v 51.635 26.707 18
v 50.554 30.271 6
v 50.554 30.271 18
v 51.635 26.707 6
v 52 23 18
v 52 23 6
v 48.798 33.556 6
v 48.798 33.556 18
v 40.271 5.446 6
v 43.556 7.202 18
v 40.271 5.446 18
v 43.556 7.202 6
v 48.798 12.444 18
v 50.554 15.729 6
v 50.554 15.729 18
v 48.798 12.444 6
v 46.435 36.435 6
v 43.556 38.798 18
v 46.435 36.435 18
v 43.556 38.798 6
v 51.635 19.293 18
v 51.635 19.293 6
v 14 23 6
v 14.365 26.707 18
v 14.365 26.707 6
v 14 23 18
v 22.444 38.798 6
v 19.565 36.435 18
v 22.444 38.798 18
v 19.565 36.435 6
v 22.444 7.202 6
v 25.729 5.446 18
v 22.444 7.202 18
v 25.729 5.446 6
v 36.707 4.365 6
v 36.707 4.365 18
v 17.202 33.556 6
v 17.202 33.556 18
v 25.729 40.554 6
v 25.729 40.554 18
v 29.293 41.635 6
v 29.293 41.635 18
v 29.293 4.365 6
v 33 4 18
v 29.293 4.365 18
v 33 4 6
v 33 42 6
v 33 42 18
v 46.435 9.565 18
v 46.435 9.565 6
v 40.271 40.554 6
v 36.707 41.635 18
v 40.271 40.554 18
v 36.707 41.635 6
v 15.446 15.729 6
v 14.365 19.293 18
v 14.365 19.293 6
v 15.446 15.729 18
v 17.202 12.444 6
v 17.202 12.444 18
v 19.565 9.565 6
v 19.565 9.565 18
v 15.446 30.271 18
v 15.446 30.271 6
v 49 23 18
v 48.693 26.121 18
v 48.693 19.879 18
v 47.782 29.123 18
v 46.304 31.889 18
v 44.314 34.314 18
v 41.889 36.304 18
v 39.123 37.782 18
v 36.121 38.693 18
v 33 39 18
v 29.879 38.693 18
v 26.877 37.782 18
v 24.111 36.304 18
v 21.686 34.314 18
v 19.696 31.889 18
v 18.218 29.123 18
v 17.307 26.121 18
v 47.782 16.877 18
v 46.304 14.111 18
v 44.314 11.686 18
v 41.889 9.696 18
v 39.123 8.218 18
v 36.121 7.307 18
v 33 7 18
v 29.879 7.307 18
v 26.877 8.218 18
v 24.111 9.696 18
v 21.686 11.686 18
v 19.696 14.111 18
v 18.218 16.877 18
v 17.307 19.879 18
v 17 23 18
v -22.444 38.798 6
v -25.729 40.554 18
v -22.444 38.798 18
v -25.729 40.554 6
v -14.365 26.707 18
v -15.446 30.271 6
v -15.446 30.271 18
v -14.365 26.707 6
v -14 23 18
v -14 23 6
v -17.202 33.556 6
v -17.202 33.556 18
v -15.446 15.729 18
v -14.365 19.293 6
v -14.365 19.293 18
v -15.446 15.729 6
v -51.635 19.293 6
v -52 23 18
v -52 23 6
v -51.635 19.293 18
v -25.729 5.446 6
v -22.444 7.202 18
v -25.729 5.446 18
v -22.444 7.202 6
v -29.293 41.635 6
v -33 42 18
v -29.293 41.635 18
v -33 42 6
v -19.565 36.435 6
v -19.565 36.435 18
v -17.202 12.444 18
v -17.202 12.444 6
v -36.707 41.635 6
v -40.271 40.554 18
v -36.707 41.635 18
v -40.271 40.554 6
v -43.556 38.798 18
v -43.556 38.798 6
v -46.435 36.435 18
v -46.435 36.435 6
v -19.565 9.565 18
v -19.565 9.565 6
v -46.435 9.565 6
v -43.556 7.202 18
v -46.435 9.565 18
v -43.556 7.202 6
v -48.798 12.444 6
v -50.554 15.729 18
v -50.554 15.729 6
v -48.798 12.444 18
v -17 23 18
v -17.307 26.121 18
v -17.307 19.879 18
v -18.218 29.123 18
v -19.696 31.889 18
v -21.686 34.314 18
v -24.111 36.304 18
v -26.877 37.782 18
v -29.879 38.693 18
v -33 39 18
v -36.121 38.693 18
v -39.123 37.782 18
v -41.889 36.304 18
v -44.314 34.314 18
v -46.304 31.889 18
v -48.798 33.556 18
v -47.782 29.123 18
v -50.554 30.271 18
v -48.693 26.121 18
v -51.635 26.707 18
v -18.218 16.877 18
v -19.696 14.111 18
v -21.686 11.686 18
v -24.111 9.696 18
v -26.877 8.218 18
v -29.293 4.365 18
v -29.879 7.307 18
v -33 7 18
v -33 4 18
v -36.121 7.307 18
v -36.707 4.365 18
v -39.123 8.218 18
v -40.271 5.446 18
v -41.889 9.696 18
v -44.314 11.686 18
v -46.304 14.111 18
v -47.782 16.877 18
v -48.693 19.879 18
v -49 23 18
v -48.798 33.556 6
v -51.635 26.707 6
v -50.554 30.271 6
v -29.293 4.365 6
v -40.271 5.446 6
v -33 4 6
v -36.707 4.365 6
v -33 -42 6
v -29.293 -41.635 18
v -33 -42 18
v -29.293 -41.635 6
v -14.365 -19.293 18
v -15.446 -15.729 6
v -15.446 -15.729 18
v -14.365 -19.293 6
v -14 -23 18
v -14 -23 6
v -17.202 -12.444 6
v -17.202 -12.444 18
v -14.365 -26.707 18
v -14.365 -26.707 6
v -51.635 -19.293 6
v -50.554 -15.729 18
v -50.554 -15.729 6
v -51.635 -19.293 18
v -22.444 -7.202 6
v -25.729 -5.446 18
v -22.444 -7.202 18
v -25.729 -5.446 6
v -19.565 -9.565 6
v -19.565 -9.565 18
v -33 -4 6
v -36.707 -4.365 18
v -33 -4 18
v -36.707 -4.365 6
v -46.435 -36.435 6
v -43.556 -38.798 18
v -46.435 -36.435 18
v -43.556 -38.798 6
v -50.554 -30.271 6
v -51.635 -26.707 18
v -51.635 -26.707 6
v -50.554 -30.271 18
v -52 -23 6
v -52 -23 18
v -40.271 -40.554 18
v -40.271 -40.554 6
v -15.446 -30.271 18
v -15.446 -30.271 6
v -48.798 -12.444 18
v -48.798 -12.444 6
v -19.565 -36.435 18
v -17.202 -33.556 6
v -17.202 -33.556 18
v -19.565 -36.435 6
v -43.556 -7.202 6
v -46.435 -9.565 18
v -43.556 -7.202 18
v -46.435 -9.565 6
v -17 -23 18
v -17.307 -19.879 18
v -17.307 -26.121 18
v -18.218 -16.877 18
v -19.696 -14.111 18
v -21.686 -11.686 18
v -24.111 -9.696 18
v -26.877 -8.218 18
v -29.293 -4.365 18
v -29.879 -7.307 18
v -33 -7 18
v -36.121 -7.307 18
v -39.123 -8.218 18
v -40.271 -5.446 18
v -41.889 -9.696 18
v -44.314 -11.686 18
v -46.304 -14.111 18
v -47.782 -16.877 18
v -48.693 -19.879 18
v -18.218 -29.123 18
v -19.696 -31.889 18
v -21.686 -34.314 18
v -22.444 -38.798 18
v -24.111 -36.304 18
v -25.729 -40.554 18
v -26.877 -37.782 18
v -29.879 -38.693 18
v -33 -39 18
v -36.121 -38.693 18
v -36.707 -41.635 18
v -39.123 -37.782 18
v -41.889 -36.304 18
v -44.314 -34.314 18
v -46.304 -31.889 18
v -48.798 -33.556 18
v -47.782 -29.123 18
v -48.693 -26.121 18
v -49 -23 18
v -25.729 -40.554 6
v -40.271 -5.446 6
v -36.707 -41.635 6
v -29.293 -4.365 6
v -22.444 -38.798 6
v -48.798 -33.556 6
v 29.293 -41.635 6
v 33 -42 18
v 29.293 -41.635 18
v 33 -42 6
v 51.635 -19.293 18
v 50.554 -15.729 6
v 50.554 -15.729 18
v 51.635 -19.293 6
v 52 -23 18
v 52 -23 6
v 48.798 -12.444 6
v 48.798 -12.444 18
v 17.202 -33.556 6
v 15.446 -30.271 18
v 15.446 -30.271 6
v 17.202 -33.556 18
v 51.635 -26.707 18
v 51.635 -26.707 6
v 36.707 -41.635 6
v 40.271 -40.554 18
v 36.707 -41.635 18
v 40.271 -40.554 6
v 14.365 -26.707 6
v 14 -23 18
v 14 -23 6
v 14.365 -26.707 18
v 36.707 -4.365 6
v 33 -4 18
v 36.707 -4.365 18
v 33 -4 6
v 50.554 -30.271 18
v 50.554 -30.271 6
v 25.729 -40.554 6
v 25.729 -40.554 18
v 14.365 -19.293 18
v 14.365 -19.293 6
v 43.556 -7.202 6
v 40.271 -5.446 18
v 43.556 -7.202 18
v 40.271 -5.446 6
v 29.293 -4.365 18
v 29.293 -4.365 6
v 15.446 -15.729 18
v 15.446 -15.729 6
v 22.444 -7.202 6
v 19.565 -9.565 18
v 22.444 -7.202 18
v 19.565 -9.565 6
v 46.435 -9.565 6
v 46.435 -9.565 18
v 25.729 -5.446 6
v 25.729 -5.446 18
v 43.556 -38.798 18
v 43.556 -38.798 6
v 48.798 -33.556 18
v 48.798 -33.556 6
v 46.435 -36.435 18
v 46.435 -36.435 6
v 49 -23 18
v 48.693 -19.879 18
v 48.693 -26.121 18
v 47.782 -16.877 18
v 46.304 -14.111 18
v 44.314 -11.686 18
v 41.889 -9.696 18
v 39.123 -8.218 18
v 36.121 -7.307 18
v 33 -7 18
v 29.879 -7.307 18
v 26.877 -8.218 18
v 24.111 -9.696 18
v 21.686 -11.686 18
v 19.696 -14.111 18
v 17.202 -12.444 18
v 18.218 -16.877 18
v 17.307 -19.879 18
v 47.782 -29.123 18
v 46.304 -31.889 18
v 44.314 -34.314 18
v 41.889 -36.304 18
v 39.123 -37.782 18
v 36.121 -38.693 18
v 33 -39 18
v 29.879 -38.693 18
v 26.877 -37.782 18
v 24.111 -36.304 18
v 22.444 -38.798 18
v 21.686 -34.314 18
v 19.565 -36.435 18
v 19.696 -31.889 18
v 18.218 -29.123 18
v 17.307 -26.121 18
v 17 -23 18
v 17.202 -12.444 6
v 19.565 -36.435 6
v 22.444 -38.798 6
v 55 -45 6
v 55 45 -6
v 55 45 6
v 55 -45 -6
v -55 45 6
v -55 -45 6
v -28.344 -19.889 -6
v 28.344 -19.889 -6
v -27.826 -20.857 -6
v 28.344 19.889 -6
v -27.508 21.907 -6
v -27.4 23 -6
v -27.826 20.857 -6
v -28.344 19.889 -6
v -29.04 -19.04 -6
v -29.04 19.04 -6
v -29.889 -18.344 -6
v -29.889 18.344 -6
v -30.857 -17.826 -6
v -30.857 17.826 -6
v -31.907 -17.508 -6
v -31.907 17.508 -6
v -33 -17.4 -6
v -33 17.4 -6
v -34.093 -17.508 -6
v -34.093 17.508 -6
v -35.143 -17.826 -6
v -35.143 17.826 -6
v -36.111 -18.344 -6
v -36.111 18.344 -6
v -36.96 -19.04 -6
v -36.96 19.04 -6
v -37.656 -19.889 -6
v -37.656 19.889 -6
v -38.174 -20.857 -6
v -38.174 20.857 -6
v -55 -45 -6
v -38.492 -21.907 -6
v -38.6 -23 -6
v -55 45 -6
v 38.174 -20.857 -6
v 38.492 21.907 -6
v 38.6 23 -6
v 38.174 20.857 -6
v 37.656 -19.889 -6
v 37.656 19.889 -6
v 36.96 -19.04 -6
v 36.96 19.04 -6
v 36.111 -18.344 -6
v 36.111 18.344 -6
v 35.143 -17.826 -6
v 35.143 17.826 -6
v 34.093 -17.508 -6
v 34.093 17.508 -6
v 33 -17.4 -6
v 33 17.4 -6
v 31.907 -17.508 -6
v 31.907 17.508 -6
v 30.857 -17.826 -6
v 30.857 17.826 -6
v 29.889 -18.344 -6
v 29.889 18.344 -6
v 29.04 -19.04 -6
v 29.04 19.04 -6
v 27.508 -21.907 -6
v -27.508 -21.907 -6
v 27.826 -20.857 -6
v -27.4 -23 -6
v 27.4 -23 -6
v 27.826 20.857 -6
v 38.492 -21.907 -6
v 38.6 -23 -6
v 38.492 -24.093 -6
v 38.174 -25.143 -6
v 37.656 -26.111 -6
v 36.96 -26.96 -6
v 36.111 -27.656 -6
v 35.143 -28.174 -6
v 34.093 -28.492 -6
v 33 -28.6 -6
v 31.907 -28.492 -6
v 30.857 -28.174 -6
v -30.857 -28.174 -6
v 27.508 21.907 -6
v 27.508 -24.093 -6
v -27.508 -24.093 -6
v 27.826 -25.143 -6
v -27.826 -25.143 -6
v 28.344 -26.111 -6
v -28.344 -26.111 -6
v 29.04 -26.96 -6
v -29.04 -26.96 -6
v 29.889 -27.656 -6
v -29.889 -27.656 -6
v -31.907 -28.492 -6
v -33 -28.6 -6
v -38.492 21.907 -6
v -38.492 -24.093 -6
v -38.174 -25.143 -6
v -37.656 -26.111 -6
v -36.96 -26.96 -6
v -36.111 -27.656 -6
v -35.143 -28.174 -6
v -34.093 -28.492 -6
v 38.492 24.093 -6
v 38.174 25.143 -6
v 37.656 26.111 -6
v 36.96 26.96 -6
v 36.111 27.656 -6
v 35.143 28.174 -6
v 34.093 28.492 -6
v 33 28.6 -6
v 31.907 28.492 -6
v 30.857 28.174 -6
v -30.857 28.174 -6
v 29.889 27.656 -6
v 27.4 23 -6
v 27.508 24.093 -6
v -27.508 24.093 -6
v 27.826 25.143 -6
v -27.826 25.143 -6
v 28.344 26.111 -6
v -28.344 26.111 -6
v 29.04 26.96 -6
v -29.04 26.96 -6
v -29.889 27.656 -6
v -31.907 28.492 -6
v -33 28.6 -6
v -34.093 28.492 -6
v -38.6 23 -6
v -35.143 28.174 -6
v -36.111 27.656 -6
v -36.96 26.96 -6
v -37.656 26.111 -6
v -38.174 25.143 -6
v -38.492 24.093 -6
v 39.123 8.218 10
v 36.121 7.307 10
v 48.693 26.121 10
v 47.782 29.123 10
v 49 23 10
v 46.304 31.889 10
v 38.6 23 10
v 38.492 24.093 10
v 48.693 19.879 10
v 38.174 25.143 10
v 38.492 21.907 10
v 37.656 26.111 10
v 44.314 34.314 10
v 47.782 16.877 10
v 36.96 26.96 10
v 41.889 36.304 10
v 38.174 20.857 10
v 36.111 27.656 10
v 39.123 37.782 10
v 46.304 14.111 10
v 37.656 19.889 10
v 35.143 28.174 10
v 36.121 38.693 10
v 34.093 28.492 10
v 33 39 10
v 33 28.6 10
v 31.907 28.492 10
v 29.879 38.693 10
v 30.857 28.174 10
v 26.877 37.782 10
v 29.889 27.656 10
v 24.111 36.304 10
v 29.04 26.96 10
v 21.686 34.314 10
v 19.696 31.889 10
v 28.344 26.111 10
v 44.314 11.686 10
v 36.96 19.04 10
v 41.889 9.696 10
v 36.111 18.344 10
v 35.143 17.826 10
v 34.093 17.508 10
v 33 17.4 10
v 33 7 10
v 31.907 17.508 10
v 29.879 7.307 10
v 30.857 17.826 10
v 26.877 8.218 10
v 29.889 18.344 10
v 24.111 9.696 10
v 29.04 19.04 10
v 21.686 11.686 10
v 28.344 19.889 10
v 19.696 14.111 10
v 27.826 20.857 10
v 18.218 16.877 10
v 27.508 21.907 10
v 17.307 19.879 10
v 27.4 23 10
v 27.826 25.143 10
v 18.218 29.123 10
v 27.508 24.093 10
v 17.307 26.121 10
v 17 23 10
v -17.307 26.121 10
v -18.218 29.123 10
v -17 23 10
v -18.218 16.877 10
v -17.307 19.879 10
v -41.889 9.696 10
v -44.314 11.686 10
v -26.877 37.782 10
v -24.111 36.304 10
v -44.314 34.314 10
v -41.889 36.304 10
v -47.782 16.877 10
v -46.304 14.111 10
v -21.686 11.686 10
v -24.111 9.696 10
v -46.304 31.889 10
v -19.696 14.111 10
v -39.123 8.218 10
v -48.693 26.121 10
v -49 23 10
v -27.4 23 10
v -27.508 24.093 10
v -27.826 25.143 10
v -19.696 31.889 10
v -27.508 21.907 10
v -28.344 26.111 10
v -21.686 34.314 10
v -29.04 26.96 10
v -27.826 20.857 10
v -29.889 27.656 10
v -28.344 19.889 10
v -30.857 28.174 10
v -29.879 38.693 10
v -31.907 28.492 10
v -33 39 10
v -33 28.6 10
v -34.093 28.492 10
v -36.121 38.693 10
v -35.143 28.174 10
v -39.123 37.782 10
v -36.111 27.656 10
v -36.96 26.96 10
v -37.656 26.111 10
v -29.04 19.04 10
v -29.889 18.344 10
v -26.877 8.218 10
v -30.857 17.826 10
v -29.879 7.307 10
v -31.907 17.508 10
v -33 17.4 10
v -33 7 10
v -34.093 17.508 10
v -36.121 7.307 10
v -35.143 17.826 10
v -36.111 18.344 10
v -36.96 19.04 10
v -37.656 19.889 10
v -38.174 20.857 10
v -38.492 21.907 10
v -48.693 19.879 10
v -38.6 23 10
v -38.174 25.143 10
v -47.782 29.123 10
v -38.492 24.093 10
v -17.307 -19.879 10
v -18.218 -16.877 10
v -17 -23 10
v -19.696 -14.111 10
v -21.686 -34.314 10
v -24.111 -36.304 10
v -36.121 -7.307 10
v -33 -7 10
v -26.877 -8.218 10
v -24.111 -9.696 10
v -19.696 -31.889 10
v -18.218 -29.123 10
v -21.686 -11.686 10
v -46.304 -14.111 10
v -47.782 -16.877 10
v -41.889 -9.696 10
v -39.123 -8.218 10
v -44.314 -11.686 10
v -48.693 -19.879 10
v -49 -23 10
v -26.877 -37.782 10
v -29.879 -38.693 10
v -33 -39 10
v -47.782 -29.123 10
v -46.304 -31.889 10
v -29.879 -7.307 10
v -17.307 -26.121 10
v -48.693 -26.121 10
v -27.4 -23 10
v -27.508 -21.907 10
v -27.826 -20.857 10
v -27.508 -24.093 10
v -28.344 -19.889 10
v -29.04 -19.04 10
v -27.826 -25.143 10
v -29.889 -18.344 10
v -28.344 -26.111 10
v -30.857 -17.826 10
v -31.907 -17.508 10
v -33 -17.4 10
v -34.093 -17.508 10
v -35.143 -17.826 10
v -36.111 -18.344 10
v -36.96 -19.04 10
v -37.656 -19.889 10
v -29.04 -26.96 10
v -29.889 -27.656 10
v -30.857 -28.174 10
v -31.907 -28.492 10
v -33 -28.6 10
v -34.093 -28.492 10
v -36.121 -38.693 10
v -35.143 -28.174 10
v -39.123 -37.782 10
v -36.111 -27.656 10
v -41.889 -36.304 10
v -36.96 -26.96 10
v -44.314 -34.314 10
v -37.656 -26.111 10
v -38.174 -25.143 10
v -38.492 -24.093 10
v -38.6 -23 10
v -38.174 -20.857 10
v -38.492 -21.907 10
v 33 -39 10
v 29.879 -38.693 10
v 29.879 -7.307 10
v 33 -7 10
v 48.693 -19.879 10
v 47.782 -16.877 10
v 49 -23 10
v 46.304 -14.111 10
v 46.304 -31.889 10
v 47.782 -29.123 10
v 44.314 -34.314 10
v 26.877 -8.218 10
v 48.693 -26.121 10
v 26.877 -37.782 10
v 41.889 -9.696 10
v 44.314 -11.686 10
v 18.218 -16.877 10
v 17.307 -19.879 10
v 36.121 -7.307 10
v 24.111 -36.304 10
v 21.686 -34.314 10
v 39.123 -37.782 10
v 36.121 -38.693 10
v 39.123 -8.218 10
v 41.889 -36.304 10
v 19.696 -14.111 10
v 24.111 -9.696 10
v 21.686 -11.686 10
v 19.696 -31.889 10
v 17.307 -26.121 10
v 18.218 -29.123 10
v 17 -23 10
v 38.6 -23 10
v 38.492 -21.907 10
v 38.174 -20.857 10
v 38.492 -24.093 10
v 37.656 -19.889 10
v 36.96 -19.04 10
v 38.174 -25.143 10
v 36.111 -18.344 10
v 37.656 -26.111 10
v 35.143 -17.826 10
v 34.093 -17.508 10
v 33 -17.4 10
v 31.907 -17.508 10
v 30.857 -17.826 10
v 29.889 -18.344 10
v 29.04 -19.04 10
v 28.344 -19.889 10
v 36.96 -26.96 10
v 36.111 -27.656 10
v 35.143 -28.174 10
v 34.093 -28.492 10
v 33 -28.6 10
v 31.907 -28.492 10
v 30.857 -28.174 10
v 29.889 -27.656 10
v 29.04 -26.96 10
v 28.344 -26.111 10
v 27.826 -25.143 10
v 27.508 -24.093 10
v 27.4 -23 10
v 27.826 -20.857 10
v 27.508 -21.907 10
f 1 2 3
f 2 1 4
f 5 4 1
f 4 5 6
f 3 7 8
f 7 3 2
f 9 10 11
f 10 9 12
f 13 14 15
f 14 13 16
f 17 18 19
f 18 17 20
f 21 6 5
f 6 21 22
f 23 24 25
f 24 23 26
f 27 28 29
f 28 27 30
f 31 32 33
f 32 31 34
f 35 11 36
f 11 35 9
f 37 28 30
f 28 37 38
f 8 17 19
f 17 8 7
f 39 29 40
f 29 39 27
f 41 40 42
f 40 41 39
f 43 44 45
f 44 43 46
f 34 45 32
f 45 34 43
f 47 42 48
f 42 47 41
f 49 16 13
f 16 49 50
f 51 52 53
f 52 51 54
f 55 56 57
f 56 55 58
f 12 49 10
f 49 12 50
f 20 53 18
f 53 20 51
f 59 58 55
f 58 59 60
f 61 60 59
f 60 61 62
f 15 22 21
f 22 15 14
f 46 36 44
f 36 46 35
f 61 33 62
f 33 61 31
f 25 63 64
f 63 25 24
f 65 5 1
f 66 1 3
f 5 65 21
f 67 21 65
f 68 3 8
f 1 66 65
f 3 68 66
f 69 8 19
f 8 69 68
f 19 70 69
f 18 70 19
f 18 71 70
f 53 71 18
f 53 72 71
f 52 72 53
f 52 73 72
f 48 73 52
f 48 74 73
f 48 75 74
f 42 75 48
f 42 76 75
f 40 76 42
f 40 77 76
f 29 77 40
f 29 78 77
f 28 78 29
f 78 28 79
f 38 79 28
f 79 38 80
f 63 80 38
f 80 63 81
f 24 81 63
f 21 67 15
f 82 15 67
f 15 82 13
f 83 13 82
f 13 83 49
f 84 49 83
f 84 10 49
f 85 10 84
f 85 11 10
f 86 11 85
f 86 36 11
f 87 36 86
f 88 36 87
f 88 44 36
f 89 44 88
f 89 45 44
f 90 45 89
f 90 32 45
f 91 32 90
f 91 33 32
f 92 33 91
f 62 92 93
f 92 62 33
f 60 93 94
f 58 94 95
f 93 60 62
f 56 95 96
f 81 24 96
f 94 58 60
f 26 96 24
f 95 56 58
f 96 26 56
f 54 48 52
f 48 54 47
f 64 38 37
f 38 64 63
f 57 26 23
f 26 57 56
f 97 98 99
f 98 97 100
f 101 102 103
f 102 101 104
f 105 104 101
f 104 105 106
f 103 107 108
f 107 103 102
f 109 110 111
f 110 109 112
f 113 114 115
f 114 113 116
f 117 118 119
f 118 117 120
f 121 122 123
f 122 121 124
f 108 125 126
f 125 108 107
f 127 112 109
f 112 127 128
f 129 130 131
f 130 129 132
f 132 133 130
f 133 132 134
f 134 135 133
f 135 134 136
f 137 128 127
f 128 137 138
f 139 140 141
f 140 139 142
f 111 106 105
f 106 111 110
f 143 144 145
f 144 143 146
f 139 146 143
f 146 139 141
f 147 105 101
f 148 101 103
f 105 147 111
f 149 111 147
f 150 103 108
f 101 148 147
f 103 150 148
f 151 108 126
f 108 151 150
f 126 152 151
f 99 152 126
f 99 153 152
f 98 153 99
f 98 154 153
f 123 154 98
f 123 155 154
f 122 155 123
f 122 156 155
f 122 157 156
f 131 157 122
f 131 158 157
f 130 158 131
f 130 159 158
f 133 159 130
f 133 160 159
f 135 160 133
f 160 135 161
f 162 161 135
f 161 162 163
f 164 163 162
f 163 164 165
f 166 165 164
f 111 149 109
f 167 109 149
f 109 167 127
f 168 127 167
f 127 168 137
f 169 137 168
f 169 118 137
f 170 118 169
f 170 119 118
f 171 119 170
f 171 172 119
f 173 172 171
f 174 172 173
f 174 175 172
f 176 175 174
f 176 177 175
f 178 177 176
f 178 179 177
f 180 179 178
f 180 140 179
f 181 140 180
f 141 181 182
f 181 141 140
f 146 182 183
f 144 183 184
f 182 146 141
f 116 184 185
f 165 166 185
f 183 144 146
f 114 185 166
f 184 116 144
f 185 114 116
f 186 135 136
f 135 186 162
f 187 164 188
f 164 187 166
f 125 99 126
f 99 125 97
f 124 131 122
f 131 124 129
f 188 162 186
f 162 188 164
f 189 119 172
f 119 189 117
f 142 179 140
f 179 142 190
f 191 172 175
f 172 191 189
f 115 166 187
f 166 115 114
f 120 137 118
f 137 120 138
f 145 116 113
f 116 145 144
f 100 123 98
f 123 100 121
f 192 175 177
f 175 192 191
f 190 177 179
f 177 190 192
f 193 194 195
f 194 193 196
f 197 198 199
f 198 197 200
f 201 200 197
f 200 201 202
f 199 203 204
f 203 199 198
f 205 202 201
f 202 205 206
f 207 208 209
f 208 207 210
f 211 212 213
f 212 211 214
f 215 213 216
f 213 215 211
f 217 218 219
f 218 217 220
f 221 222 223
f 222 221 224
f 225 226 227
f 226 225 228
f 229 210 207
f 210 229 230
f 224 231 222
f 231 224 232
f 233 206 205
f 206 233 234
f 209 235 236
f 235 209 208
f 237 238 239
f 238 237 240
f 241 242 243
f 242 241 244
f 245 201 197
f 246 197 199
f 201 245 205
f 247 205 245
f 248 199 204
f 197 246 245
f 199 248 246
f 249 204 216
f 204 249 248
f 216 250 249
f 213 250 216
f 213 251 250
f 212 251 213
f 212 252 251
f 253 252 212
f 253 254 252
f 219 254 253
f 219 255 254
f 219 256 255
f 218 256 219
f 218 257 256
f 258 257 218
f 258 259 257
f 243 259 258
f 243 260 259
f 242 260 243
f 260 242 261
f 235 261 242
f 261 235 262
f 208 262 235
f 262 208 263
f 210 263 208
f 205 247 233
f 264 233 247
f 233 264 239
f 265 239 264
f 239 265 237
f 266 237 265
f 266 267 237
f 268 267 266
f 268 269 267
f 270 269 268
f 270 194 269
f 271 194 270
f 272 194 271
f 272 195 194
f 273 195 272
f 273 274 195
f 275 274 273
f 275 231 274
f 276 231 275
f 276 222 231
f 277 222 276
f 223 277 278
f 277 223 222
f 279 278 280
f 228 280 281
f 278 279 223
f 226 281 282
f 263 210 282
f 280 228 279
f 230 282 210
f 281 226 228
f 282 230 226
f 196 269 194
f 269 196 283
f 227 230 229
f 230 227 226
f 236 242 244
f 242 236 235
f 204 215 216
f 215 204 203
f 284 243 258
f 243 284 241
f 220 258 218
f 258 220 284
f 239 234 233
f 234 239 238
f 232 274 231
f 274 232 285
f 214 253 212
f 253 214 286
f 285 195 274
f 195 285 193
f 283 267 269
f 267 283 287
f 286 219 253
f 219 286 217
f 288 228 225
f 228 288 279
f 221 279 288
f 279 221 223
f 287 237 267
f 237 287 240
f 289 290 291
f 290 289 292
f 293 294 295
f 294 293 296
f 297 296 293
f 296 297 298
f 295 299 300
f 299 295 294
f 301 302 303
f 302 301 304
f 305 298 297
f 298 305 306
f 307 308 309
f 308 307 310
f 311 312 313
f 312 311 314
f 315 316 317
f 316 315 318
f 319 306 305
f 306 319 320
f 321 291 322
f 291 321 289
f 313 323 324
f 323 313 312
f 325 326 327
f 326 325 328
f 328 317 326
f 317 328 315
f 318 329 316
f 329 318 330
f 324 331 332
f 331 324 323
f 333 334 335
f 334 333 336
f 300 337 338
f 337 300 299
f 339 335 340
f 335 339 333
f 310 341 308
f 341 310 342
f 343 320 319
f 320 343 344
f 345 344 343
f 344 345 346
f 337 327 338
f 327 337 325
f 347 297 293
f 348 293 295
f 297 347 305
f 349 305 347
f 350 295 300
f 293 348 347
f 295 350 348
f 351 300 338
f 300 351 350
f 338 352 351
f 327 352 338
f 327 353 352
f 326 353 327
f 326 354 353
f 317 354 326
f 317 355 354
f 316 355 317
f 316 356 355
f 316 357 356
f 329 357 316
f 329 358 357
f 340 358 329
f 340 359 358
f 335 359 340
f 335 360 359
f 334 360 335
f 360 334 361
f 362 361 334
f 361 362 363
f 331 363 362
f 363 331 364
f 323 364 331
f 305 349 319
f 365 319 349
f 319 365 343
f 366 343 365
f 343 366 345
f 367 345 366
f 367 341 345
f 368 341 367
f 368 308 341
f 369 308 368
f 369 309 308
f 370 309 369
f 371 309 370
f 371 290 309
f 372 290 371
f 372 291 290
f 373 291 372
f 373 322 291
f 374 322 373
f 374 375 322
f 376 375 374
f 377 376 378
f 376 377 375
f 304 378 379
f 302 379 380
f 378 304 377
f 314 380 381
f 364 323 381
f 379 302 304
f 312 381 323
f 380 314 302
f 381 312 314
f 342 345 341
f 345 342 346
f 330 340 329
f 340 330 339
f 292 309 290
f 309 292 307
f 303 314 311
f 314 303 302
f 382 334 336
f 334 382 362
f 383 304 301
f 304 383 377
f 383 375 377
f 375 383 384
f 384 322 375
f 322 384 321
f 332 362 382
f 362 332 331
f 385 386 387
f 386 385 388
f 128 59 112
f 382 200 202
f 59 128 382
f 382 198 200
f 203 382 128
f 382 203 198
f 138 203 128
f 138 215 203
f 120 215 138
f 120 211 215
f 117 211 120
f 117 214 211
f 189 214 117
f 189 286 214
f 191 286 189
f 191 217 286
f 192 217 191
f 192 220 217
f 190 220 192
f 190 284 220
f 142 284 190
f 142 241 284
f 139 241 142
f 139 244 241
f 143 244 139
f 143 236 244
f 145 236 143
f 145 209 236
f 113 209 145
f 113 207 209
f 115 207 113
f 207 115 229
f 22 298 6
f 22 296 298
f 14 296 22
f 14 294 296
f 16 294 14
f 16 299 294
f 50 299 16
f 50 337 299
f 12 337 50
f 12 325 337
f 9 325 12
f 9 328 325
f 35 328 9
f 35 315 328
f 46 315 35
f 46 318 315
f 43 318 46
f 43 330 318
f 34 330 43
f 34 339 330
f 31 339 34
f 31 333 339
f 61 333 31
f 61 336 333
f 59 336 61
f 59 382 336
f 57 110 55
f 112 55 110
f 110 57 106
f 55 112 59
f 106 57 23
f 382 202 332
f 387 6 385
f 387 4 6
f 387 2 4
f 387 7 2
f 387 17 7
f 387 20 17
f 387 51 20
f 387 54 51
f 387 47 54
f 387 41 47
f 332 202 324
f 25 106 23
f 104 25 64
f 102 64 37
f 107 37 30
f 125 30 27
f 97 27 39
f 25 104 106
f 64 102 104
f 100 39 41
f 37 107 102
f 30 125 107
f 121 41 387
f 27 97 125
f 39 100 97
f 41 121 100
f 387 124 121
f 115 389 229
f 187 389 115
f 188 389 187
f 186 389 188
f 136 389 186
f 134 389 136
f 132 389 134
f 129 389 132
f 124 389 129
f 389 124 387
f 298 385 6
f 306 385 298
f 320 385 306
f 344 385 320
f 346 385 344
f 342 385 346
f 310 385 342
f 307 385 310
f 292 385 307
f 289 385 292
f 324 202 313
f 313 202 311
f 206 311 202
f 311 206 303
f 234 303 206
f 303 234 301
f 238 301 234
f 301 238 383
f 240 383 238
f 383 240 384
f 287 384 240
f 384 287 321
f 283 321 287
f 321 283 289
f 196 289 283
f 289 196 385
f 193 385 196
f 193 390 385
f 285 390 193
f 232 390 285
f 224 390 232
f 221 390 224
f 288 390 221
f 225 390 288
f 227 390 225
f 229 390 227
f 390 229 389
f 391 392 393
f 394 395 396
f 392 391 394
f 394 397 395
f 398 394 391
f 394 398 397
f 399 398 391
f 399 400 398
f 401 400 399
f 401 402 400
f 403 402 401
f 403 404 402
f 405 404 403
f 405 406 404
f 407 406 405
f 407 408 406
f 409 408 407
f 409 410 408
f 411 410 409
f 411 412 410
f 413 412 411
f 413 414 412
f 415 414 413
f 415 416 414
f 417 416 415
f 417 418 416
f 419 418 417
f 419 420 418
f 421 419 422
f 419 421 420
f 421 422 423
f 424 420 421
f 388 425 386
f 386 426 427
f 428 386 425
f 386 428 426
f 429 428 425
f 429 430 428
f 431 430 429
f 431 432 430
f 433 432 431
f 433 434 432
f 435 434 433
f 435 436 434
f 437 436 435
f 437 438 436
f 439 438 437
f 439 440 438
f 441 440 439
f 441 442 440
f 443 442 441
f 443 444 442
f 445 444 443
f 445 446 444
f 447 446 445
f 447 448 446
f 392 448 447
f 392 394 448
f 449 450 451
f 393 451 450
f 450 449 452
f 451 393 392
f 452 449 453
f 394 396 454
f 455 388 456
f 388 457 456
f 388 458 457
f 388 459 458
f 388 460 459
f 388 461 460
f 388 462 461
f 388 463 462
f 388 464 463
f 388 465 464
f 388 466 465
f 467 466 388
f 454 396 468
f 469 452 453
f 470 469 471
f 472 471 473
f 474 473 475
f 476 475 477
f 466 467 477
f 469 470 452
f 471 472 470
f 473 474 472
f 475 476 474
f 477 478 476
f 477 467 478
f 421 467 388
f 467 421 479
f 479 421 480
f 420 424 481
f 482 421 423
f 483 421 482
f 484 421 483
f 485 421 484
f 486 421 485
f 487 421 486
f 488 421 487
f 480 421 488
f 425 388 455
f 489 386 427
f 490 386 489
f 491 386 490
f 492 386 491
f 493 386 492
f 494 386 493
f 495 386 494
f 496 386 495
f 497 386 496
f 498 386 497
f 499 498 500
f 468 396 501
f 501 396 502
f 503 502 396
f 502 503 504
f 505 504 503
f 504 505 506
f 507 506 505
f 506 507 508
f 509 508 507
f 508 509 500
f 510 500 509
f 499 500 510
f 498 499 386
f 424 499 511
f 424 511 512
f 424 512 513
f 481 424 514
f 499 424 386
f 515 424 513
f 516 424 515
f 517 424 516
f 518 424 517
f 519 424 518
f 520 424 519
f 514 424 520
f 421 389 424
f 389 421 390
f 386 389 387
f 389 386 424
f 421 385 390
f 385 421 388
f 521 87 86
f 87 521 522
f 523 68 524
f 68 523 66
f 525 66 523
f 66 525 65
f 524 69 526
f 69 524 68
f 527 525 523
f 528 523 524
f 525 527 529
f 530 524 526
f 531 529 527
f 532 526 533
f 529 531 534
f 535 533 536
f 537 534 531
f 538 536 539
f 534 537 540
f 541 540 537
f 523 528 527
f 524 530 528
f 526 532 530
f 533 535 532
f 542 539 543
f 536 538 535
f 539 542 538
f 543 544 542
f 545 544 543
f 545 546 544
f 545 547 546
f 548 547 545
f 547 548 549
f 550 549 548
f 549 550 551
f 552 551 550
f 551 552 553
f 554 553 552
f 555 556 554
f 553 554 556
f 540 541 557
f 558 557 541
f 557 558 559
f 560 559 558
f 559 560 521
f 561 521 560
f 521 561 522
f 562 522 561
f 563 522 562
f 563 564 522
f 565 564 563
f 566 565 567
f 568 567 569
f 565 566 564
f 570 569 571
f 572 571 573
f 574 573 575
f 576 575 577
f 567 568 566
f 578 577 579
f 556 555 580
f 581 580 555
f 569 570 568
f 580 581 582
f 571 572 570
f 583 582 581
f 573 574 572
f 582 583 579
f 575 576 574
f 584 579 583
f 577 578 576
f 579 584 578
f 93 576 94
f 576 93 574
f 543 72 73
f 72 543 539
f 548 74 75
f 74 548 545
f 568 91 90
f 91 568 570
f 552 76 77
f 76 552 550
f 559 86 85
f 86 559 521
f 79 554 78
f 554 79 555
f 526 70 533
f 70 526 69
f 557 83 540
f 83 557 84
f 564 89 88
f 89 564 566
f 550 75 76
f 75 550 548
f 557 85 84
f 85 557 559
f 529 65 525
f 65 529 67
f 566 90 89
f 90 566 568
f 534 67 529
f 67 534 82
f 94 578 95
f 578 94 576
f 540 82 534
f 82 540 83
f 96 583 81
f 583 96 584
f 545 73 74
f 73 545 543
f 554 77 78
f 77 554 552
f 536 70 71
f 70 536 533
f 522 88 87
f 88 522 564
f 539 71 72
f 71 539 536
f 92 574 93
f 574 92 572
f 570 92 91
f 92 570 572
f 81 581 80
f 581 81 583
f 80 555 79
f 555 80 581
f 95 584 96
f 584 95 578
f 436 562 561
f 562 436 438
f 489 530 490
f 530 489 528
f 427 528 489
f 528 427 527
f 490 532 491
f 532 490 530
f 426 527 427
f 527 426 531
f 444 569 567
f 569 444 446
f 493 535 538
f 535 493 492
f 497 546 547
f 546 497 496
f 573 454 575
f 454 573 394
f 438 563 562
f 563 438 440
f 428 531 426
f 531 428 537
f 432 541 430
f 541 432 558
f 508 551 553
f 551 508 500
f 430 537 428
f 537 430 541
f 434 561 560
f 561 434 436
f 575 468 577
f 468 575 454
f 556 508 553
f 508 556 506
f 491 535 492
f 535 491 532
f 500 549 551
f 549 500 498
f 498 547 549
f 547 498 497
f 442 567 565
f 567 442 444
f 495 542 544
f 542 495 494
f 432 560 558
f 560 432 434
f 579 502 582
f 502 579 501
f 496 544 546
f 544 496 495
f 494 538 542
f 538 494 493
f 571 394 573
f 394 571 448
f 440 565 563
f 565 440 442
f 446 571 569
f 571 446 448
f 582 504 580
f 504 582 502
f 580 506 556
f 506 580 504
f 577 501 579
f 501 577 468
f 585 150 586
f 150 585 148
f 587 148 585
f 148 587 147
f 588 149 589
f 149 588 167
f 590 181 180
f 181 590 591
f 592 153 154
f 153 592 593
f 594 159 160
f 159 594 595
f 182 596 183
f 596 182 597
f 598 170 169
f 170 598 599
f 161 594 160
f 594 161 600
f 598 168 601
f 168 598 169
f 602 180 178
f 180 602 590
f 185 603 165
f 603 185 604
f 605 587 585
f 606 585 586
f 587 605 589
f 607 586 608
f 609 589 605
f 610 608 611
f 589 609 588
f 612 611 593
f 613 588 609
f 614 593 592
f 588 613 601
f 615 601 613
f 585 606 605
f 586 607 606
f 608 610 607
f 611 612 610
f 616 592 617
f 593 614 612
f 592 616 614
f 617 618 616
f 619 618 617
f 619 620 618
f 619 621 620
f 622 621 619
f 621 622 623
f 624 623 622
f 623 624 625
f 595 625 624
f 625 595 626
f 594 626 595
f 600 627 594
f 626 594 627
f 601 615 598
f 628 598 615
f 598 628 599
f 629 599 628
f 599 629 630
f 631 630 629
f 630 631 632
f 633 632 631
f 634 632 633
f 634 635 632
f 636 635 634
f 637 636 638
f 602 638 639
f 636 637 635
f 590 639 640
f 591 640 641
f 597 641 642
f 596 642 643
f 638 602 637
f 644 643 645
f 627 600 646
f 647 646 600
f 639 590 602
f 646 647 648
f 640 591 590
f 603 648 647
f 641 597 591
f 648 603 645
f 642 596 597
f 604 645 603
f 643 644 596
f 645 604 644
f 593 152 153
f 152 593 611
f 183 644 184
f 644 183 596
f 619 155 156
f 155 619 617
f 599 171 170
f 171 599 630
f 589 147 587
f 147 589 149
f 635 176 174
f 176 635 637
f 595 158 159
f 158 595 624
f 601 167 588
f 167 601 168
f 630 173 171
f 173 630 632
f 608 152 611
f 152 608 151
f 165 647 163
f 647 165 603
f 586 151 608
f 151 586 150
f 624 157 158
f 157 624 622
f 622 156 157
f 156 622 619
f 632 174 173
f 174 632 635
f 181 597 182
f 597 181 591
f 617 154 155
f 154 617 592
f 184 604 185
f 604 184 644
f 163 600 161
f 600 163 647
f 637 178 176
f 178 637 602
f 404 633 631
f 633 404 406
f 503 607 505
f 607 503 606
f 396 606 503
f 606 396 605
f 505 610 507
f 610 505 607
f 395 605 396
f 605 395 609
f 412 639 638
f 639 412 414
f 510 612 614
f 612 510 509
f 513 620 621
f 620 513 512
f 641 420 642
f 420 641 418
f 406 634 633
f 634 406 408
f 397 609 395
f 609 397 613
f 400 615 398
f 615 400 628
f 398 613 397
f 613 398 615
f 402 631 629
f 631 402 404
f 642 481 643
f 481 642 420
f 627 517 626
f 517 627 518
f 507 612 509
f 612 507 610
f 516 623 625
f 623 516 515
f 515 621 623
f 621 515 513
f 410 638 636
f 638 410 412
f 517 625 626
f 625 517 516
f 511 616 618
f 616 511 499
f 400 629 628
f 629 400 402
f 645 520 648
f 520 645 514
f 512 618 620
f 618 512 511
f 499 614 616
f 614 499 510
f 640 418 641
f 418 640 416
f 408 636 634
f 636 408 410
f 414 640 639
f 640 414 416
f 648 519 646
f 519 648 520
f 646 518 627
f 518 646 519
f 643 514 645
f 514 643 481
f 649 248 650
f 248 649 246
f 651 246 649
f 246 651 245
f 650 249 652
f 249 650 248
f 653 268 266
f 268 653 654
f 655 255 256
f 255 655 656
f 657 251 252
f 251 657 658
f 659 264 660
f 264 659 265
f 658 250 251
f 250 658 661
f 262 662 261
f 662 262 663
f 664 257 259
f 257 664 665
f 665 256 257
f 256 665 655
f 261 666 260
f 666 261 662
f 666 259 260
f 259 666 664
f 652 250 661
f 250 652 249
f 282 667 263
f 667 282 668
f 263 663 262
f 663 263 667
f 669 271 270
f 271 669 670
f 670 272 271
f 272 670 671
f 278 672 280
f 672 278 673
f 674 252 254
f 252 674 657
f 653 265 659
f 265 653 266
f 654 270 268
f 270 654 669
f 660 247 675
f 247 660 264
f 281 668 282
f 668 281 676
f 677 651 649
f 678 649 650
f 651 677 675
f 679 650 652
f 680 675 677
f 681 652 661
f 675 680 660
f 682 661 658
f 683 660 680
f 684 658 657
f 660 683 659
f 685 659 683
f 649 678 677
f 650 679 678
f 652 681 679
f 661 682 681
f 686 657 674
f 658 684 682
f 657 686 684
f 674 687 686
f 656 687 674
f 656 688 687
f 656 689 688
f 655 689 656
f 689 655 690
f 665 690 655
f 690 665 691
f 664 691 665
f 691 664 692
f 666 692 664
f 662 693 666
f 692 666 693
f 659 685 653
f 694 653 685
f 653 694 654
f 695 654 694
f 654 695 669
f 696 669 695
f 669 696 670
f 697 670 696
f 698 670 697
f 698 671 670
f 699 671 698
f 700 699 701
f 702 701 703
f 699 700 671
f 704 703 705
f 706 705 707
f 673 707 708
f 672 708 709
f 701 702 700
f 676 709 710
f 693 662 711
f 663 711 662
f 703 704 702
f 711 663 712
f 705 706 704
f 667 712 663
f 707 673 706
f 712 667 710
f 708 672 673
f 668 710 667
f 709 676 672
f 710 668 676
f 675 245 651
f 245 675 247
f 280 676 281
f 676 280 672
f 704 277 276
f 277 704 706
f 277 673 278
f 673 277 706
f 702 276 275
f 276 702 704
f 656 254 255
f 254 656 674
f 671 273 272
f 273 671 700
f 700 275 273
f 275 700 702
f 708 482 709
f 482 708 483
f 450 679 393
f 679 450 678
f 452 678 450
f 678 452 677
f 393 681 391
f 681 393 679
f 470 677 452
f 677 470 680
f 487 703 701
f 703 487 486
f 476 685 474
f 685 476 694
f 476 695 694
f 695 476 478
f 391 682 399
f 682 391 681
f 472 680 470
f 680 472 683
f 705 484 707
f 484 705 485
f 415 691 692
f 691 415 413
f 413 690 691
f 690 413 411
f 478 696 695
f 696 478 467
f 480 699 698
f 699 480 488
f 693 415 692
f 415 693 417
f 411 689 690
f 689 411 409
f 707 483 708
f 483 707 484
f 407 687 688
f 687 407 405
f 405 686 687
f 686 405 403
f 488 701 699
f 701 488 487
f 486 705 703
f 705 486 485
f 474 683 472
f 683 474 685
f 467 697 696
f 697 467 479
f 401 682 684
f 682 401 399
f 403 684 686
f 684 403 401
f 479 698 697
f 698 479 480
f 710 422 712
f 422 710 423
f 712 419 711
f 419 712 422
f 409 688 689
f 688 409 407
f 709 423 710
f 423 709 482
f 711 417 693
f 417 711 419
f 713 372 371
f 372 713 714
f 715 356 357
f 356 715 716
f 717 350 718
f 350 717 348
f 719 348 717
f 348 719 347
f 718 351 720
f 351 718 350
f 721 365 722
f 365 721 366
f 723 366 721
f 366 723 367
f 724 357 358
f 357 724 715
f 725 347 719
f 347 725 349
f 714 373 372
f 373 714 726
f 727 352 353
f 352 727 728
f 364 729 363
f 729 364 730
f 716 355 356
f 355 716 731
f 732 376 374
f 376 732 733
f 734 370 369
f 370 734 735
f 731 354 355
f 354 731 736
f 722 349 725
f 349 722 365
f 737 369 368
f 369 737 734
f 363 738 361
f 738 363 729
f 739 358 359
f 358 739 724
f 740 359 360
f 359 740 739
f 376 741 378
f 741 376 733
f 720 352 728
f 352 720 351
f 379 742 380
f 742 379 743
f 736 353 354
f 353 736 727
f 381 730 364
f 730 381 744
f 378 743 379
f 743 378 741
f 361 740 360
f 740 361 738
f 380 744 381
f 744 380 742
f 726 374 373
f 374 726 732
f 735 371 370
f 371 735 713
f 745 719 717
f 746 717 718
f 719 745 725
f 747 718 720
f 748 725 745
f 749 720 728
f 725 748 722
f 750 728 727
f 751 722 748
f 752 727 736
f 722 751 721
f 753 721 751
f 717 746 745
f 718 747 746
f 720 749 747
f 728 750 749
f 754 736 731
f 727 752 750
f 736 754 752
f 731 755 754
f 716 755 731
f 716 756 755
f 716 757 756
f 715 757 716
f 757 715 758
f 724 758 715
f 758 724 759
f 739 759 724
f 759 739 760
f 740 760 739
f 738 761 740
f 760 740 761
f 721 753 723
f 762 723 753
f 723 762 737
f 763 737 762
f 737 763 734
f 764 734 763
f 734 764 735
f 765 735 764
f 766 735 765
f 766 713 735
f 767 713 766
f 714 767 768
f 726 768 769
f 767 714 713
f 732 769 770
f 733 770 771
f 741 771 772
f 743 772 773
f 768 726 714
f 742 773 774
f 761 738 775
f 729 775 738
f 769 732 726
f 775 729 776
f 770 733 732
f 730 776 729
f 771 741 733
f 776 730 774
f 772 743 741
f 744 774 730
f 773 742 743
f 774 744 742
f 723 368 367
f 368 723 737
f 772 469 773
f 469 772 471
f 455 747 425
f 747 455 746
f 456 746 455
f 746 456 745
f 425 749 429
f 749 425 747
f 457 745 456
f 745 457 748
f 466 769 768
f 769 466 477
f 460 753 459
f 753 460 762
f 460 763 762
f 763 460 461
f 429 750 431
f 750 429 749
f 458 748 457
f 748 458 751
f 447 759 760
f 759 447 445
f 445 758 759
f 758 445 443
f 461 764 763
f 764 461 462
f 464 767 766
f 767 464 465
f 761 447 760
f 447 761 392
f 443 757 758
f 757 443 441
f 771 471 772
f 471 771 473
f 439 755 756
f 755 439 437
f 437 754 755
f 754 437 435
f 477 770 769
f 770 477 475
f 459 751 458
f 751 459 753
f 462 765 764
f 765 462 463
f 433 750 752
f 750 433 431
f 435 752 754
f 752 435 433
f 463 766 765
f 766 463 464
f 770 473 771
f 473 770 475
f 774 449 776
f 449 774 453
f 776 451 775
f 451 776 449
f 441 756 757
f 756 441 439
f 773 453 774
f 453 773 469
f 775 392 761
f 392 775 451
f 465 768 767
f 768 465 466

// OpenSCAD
$fn = 32;

// ----------------------------------------------------------------------
// Socket pad plate
// bosses with counterbored sockets for the screws
// ----------------------------------------------------------------------

// --- parameters (mm) ---
base_t = 12;            // base plate thickness
boss_h = 12;            // boss height above the base plate
boss_d = 38;            // boss diameter
socket_d = 32;          // socket diameter
socket_depth = 8;       // socket depth from the boss face
bolt_d = 11.2;          // screw clearance hole through the socket floor
plate = [110, 90, 12];  // overall size (x, y, z)
edge = 22;              // boss centre offset from the plate edge
pads = 4;               // boss count, one per corner

// --- derived feature positions (mm) ---
height = base_t + boss_h;        // = 24   overall height of the part
corner_x = plate[0] / 2 - edge;  // = 33   boss centre X
corner_y = plate[1] / 2 - edge;  // = 23   boss centre Y
feature_centers = [
  [corner_x, corner_y],
  [-corner_x, corner_y],
  [-corner_x, -corner_y],
  [corner_x, -corner_y]
];   // boss centres: sockets, holes and the pads themselves are placed from here

// base plate, bosses on feature_centers, socket + through hole in each
difference() {
  union() {
    cube(plate, center = true);
    for (centre = feature_centers)
      translate([centre[0], centre[1], plate[2] / 2 - 1])
        cylinder(d = boss_d, h = boss_h + 1);
  }
  for (centre = feature_centers) {
    translate([centre[0], centre[1], plate[2] / 2 + boss_h - socket_depth])
      cylinder(d = socket_d, h = socket_depth + 1);
    translate([centre[0], centre[1], -height])
      cylinder(d = bolt_d, h = 2 * height + 2);  // through the socket floor
  }
}
